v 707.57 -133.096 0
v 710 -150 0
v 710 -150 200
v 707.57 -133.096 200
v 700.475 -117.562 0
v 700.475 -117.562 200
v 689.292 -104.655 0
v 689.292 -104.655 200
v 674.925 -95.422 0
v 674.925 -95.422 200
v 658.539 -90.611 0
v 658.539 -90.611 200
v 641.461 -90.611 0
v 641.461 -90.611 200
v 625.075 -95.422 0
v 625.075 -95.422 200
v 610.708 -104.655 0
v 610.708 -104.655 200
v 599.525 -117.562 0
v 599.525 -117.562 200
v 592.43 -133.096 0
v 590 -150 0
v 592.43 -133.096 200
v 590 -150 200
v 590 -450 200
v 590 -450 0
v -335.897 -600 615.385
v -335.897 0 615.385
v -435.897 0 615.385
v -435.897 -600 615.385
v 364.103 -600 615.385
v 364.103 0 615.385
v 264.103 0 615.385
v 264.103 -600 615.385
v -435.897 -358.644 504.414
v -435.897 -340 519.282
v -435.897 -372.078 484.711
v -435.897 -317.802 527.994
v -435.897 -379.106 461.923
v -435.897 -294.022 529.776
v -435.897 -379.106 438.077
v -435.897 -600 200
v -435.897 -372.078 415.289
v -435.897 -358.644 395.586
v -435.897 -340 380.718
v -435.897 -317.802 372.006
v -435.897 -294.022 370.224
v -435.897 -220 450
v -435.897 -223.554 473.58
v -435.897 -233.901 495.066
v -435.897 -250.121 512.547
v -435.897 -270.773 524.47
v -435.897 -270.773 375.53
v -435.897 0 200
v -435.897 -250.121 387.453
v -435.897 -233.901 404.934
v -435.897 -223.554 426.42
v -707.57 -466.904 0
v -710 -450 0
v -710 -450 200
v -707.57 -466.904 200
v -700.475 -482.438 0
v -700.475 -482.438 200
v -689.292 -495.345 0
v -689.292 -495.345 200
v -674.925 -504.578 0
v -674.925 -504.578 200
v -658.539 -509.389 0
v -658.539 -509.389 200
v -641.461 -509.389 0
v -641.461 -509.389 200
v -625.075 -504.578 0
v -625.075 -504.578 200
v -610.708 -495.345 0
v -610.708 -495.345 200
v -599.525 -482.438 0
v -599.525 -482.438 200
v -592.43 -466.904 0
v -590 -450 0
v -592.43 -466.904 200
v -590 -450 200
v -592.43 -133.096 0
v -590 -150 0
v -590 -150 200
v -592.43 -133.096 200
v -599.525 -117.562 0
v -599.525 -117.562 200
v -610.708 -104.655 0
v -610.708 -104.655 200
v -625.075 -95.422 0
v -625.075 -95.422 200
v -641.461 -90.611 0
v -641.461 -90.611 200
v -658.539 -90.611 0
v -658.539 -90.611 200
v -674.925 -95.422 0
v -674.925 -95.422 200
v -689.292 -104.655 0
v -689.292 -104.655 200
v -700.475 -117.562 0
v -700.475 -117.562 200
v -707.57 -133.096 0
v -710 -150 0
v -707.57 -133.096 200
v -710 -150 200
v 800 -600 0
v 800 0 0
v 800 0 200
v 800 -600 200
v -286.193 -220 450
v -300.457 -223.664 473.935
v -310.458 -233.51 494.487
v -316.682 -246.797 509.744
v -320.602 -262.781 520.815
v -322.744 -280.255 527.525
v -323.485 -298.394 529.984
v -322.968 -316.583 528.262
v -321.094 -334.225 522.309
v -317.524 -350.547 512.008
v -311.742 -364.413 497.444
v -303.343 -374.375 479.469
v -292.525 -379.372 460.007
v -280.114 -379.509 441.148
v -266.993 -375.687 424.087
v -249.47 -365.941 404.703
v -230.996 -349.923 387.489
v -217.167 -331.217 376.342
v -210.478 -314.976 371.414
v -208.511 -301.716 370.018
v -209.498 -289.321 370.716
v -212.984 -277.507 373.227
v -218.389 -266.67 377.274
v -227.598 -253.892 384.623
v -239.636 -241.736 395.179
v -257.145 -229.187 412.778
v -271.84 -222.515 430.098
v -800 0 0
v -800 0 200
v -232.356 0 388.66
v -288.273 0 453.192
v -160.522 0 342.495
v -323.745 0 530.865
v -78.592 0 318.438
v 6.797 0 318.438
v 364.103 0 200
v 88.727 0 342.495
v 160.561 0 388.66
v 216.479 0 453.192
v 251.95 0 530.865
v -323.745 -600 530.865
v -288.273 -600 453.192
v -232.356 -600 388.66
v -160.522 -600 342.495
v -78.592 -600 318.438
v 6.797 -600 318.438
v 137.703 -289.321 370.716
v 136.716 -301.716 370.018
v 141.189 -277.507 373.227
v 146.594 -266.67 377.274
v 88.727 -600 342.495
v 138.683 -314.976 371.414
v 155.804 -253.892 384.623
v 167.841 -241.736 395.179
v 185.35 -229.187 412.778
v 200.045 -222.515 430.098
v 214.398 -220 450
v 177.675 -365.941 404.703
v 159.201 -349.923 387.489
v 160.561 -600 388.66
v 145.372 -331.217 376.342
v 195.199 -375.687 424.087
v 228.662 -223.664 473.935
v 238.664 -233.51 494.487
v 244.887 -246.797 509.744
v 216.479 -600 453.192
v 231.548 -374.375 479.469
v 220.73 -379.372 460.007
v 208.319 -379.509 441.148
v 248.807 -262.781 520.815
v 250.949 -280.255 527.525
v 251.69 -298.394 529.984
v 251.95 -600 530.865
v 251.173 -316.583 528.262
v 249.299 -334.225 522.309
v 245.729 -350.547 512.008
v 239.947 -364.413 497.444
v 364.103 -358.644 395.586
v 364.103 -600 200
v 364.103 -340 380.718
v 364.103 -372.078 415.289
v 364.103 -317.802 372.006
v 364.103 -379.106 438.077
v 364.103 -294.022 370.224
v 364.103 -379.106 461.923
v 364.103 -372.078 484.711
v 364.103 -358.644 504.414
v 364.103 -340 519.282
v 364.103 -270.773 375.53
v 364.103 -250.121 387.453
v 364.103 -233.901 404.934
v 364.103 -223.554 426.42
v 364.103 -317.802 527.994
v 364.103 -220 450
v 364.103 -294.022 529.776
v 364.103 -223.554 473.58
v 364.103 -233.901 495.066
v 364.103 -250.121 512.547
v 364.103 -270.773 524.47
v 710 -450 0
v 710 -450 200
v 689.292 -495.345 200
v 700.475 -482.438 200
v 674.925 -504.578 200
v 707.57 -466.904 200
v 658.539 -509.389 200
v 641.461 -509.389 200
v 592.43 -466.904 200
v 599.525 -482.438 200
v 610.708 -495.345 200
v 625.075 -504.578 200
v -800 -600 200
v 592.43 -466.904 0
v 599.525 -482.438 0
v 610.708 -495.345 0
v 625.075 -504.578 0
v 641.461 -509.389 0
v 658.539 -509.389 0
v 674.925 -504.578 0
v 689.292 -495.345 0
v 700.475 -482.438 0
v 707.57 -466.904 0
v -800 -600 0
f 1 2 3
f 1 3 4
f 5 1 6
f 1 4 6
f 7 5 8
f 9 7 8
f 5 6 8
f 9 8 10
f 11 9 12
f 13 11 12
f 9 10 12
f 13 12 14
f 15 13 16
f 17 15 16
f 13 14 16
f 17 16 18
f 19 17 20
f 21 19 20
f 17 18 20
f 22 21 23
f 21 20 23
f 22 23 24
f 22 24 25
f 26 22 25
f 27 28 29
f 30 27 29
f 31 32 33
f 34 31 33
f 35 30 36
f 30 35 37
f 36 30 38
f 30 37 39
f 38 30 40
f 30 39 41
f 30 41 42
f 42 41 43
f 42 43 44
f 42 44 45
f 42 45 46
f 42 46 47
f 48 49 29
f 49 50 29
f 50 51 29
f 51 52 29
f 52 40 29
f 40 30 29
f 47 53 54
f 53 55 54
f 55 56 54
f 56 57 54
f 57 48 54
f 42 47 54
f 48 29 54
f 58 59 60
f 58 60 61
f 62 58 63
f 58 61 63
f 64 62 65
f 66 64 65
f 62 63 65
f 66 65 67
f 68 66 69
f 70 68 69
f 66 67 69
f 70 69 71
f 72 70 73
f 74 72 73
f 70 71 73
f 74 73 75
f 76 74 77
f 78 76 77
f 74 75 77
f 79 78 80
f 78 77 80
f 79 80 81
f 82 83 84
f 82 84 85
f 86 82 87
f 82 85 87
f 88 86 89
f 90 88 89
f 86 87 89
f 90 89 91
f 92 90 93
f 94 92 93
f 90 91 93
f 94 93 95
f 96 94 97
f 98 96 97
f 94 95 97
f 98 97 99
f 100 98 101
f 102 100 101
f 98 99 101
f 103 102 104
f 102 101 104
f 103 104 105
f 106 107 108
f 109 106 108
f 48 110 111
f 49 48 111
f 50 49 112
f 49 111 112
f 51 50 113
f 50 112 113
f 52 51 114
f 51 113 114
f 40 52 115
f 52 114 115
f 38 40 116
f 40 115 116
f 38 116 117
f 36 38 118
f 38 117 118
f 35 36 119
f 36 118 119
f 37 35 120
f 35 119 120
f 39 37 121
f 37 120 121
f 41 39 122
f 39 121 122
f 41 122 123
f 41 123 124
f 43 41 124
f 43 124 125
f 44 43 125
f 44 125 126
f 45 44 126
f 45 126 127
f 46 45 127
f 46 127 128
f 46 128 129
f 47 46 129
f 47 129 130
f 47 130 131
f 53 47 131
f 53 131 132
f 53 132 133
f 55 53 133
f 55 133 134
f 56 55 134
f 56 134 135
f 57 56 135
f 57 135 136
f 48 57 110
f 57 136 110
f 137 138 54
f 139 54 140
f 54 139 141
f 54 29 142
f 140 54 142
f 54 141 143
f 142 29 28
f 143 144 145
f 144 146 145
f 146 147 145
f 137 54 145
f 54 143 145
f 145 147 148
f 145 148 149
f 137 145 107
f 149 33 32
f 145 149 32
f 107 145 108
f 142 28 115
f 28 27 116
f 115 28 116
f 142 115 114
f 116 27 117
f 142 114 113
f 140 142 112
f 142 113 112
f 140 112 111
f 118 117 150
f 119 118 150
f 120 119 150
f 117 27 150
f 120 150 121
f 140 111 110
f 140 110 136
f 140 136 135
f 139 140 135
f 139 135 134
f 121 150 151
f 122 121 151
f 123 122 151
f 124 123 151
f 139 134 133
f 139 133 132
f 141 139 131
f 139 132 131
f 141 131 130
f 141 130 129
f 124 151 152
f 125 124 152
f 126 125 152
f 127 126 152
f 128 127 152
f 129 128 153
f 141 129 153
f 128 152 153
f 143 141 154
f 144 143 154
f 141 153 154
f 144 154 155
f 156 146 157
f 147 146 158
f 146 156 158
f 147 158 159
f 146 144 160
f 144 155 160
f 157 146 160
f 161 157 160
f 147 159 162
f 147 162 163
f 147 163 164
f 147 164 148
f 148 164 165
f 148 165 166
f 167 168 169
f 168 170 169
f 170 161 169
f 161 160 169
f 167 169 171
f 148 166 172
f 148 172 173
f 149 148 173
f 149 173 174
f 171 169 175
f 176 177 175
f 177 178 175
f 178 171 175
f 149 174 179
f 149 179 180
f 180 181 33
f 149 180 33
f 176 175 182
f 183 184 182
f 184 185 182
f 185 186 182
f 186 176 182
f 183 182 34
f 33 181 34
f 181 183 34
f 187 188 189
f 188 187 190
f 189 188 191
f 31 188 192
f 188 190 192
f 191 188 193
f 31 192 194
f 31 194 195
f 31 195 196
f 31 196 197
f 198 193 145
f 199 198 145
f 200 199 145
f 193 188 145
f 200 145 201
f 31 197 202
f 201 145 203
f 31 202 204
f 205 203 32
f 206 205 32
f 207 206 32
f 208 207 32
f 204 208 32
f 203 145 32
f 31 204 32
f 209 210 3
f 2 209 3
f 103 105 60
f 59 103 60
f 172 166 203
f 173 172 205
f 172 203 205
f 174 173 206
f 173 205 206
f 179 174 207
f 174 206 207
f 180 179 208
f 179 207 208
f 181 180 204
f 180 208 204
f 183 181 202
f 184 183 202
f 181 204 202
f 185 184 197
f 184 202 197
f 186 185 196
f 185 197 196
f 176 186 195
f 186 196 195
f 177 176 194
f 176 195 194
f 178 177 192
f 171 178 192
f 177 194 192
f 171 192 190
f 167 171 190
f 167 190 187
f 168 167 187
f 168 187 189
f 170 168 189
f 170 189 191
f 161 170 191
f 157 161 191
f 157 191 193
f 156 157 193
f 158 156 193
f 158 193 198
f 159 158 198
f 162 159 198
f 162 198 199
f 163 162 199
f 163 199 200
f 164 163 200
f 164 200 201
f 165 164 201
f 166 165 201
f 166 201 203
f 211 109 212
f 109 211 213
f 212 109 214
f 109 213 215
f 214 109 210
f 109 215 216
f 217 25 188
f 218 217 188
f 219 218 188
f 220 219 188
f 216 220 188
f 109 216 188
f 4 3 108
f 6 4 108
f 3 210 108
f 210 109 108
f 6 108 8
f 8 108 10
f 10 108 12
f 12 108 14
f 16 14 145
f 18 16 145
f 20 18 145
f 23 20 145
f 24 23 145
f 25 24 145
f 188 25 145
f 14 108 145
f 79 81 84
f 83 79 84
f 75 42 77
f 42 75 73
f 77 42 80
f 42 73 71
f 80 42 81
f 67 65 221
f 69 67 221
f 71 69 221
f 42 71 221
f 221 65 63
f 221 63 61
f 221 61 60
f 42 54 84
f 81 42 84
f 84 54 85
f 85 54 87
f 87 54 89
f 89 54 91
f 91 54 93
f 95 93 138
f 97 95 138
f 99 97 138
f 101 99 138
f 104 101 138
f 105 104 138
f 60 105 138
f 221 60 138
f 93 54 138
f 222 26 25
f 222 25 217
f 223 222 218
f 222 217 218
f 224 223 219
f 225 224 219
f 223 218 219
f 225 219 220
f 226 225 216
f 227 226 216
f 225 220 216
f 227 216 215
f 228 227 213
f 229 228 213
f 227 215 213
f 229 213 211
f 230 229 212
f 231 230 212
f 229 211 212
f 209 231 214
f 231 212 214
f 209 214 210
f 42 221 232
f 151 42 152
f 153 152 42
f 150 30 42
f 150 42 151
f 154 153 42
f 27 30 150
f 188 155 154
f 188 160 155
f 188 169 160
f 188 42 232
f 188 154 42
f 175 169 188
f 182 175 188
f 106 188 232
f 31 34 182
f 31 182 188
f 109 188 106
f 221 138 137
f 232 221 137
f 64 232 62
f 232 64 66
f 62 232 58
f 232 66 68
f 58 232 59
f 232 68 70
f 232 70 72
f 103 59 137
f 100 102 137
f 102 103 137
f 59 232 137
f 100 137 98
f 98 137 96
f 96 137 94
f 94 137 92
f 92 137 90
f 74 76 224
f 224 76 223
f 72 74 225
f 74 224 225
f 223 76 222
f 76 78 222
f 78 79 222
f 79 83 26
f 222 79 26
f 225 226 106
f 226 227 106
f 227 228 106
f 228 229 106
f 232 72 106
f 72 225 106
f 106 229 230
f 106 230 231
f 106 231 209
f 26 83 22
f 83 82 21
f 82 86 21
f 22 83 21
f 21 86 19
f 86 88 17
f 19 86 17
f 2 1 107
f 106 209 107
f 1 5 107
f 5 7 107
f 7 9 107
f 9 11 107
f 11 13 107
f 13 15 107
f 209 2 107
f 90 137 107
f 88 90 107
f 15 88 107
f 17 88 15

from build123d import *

# Parameters (mm, degrees)
F1_DEPTH = 600
F3_DEPTH = 600.001
F4_R     = 80
F5_DEPTH = 1600.001
F7_DEPTH = 200.001


with BuildPart() as f1:
    # F0 (on Front) → F1 (new body)
    with BuildSketch(Plane.XZ):
        Polygon((-800, 0), (0, 0), (800, 0), (800, 200), (364.102565, 200), (364.102565, 615.384671), (-435.897435, 615.384671), (-435.897435, 200), (-800, 200), align=None)
    extrude(amount=F1_DEPTH)

    # F2 (on face) → F3 (cut, through all)
    with BuildSketch(Plane.XZ.offset(600)):
        with BuildLine():
            Line((264.102565, 615.384671), (-335.897435, 615.384671))
            ThreePointArc((-335.897435, 615.384671), (-35.897435, 315.384671), (264.102565, 615.384671))
        make_face()
    extrude(amount=-F3_DEPTH, mode=Mode.SUBTRACT)

    # F4 (on face) → F5 (cut, through all)
    with BuildSketch(Plane.YZ.offset(800)):
        with Locations((-300, 450)):
            Circle(F4_R)
    extrude(amount=-F5_DEPTH, mode=Mode.SUBTRACT)

    # F6 (on face) → F7 (cut, through all)
    with BuildSketch(Plane.XY.offset(200)):
        with BuildLine():
            Line((-710, -150), (-710, -450))
            ThreePointArc((-710, -450), (-650, -510), (-590, -450))
            Line((-590, -450), (-590, -150))
            ThreePointArc((-590, -150), (-650, -90), (-710, -150))
        make_face()
        with BuildLine():
            Line((590, -150), (590, -450))
            ThreePointArc((590, -450), (650, -510), (710, -450))
            Line((710, -450), (710, -150))
            ThreePointArc((710, -150), (650, -90), (590, -150))
        make_face()
    extrude(amount=-F7_DEPTH, mode=Mode.SUBTRACT)


solid = f1.part
